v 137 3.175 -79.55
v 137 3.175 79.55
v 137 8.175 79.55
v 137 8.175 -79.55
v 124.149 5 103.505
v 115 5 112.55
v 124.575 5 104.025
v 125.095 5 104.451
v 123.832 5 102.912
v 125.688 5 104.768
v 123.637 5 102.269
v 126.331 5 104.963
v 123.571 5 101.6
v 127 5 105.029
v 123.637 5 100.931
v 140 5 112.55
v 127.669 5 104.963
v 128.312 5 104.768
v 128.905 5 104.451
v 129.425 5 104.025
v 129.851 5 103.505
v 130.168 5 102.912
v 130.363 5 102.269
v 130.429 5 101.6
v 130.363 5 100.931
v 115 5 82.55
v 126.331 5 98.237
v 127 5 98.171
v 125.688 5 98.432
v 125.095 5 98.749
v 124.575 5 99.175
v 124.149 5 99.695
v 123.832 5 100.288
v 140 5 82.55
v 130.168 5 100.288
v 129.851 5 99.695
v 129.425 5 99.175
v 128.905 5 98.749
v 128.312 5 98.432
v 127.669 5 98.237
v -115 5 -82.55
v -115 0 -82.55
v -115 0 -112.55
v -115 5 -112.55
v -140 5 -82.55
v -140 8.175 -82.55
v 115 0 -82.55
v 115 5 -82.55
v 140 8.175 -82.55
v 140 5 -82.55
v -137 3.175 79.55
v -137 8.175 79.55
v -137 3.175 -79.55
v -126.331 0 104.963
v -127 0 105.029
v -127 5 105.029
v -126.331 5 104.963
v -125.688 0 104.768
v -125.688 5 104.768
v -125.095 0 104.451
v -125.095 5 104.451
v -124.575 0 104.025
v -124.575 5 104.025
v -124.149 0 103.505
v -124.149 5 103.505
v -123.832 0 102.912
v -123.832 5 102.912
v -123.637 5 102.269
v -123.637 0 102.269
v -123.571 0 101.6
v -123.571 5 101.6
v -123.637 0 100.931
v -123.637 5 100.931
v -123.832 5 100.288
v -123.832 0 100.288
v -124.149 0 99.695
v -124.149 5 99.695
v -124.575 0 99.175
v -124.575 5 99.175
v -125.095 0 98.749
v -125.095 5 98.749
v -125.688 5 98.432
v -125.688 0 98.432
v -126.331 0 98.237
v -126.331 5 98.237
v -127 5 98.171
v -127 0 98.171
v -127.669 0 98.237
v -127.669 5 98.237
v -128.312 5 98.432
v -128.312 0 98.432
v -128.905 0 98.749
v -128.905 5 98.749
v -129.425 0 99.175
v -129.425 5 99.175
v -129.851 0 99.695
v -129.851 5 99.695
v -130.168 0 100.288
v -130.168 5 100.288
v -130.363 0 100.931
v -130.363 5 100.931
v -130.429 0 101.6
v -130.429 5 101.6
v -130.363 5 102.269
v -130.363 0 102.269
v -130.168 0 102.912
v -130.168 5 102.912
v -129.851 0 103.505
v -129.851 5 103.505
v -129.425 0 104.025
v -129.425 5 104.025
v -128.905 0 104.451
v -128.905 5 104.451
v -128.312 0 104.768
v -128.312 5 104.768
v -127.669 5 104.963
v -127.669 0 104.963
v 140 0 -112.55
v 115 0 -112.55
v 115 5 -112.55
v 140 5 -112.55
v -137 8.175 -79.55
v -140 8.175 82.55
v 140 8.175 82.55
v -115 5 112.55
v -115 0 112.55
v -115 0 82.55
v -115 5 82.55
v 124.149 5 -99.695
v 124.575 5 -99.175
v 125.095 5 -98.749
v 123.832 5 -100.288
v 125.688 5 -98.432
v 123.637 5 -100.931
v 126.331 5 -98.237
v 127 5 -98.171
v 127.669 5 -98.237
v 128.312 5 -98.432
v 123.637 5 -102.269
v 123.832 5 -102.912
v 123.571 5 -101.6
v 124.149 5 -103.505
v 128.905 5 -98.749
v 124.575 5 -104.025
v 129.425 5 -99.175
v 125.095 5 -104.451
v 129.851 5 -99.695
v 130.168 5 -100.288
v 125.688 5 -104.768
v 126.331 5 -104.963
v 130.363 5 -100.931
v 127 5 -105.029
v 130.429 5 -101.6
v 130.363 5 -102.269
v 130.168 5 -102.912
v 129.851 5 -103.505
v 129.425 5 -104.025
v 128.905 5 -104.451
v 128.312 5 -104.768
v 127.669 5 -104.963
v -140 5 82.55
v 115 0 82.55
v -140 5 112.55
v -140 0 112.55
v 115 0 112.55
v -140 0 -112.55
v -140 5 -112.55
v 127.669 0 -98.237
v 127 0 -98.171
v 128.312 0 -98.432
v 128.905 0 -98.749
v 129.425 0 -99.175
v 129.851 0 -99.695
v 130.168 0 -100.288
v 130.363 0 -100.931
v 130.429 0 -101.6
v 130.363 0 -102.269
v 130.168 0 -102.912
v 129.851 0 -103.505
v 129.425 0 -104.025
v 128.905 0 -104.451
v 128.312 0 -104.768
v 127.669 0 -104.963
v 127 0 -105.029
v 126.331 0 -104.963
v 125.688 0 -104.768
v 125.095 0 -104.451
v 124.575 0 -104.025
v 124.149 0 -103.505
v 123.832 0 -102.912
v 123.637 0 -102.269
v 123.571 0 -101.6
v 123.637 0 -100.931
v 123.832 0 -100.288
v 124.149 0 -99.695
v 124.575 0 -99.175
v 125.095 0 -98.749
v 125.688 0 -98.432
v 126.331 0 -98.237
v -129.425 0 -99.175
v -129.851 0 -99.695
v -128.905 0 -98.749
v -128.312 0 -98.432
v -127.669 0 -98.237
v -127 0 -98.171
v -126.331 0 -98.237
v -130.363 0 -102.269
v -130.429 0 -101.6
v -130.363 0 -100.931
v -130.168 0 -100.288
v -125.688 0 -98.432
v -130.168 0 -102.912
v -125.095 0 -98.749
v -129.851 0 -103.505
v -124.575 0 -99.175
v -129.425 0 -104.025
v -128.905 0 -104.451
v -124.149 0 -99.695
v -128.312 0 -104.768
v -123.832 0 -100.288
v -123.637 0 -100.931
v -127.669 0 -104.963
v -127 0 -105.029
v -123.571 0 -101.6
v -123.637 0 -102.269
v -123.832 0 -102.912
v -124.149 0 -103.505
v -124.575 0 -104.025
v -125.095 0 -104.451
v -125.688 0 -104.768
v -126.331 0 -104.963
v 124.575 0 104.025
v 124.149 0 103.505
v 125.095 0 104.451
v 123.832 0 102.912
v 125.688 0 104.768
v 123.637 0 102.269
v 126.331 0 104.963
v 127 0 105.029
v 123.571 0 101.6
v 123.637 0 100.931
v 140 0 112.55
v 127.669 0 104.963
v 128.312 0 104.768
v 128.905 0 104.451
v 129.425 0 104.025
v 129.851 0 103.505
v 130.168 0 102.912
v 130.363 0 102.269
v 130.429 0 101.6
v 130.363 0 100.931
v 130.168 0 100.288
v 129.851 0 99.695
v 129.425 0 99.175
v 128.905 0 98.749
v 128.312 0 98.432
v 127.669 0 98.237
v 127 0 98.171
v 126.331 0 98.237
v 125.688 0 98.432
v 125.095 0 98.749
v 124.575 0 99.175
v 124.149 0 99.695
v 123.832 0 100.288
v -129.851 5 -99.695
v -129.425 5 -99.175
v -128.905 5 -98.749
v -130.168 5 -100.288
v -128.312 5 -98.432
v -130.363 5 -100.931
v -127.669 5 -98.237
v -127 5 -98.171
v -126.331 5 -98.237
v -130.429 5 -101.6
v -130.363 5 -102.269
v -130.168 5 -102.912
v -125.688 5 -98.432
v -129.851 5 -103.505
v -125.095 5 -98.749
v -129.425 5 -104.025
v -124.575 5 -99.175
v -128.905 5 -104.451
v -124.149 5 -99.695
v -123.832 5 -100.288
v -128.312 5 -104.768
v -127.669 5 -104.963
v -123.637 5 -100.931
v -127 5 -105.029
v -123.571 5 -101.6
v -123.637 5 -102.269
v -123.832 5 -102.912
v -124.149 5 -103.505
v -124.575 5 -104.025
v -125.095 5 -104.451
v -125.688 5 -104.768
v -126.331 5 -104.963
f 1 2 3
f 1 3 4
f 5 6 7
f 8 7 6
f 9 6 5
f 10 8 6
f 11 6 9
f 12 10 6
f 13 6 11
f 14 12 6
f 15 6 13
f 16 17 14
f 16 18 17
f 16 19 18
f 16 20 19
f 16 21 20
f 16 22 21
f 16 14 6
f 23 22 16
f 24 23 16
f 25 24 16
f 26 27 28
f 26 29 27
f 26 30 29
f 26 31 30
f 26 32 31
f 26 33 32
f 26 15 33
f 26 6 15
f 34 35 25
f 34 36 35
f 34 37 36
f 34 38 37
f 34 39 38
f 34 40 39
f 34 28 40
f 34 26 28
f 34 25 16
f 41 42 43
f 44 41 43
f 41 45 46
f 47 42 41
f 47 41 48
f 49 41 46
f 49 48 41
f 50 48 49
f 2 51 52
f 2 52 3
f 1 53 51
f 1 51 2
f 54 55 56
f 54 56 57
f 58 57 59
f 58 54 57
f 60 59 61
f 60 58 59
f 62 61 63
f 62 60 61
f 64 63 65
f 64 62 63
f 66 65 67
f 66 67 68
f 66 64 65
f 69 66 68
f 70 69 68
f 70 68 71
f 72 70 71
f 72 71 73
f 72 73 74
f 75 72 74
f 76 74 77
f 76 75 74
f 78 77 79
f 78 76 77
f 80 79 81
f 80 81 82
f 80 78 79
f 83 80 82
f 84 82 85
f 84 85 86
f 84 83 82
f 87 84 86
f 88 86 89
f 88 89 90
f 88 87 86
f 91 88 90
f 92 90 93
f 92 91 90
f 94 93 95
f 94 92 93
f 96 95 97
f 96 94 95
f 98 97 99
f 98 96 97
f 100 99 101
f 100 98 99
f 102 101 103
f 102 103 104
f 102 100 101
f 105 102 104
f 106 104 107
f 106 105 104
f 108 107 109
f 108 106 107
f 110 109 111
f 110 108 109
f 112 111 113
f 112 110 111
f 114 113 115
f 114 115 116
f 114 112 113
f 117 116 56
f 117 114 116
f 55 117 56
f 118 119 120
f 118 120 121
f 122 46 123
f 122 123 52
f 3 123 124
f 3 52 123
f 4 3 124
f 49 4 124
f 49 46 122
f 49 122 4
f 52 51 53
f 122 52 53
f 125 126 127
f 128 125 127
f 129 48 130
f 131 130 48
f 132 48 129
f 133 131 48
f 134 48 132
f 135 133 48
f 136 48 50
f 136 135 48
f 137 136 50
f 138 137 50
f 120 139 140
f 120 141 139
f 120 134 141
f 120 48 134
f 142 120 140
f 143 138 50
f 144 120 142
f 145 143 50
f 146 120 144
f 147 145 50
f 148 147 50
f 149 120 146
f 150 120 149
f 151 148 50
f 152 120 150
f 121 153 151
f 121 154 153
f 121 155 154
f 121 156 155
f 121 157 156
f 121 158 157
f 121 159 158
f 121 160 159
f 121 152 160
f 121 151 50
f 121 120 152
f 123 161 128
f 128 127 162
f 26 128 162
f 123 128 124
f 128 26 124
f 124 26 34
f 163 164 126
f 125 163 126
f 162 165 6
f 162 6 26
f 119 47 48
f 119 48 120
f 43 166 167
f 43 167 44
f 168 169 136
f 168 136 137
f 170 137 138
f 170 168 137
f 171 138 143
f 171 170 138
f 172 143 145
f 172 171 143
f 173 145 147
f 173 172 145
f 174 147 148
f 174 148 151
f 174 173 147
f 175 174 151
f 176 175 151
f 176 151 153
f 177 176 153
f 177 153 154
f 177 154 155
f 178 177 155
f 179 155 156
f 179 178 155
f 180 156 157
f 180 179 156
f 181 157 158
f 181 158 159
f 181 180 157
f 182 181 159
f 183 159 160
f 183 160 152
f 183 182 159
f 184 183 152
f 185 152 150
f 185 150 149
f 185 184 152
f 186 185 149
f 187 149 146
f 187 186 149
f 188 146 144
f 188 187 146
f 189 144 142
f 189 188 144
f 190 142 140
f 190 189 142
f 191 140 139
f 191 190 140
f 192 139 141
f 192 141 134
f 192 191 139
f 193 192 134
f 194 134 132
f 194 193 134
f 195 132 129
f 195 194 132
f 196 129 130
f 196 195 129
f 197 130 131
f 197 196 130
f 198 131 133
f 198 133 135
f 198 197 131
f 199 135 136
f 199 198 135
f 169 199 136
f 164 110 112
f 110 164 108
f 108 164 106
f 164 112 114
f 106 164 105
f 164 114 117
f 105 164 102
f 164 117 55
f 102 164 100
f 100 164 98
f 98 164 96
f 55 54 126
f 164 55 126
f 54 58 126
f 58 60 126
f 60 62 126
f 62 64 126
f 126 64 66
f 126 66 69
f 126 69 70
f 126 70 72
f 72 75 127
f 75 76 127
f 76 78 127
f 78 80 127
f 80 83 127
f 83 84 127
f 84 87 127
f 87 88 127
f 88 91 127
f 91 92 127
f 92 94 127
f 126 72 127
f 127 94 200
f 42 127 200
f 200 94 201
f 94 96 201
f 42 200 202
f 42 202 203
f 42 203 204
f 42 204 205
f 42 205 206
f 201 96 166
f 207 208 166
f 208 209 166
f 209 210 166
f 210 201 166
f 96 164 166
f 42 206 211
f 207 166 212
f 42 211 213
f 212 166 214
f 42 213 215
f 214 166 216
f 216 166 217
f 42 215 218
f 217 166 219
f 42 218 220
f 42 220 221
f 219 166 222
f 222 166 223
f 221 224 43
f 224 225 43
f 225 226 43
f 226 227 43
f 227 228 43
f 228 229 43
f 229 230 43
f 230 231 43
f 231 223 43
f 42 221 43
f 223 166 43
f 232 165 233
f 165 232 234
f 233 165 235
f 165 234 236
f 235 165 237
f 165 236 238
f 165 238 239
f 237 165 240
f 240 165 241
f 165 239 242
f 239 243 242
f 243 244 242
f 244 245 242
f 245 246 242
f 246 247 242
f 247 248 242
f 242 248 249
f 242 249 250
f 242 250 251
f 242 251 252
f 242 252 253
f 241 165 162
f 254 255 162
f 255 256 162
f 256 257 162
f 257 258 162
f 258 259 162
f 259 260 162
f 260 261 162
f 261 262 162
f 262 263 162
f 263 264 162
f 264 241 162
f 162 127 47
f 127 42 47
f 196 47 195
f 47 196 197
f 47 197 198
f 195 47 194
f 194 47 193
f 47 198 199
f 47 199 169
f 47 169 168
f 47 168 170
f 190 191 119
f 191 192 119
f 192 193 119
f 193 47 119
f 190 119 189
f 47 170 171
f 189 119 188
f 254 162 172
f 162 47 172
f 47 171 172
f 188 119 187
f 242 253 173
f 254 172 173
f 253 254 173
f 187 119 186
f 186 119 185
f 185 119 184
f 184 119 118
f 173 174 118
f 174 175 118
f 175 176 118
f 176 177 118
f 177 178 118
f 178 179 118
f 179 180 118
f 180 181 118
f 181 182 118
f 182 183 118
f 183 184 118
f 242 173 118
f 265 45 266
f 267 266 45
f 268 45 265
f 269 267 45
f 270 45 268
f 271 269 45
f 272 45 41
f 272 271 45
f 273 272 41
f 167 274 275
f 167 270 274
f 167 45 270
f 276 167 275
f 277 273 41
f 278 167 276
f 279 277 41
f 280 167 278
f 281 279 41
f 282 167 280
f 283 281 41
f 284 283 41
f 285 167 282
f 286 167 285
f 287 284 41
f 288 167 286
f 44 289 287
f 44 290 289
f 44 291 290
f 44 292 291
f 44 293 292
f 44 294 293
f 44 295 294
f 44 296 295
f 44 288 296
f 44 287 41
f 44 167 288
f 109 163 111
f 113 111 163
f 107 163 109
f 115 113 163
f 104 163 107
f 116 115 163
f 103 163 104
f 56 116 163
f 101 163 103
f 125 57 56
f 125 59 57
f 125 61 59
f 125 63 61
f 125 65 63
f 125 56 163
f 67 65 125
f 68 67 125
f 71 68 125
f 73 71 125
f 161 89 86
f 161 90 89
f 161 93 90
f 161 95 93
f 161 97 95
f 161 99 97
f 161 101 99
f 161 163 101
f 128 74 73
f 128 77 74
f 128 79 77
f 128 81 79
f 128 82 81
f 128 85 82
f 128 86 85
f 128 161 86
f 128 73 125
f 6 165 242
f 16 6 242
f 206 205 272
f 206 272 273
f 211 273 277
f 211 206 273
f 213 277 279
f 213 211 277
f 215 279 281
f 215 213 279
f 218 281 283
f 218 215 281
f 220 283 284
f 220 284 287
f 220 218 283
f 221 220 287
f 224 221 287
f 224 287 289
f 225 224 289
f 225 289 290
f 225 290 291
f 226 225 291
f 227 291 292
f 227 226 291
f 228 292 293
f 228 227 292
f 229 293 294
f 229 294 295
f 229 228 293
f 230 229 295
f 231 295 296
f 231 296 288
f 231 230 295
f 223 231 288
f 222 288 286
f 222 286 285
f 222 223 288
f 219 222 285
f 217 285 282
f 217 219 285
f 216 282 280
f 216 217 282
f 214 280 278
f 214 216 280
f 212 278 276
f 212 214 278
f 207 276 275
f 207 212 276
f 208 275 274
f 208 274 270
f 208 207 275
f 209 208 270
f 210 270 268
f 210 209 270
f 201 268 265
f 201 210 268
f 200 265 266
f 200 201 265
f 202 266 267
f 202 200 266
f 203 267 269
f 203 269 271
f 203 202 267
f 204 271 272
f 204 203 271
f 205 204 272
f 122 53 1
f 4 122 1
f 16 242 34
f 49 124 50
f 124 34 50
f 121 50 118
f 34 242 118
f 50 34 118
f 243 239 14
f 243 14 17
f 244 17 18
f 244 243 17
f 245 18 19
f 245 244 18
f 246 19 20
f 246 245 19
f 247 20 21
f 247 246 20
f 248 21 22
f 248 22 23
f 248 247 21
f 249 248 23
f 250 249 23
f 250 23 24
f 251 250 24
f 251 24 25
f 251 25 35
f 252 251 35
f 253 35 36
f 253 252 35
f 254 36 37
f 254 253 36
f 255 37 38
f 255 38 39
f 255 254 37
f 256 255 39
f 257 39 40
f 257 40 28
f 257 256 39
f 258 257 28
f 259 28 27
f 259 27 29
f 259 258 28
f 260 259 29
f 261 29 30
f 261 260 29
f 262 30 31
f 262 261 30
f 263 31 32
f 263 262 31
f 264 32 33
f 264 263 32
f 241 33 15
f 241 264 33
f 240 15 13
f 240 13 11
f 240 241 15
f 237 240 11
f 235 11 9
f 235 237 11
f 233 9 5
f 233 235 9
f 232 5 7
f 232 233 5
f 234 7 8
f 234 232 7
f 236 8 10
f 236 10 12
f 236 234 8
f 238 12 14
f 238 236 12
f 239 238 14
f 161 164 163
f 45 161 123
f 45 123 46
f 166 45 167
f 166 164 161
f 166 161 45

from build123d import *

# Parameters (mm, degrees)
SKETCH1_W           = 280
SKETCH1_H           = 165.1
BOSS_EXTRUDE1_DEPTH = 3.175
SKETCH2_W           = 280
SKETCH2_H           = 165.1
SKETCH2_W_2         = 274
SKETCH2_H_2         = 159.1
BOSS_EXTRUDE2_DEPTH = 5
SKETCH3_W           = 25
SKETCH3_H           = 30
SKETCH3_R           = 3.429
BOSS_EXTRUDE3_DEPTH = 5


with BuildPart() as part:
    # Sketch1 → Boss-Extrude1 (new body)
    with BuildSketch(Plane(origin=(0, 0, 0), x_dir=(1, 0, 0), z_dir=(0, 1, 0))):
        Rectangle(SKETCH1_W, SKETCH1_H)
    extrude(amount=BOSS_EXTRUDE1_DEPTH)

    # Sketch2 → Boss-Extrude2 (add)
    with BuildSketch(Plane(origin=(0, 3.175, 0), x_dir=(1, 0, 0), z_dir=(0, 1, 0))):
        Rectangle(SKETCH2_W, SKETCH2_H)
        Rectangle(SKETCH2_W_2, SKETCH2_H_2, mode=Mode.SUBTRACT)
    extrude(amount=BOSS_EXTRUDE2_DEPTH)

    # Sketch3 → Boss-Extrude3 (add)
    # profile 1 of 4: a face of its own
    with BuildSketch(Plane(origin=(0, 0, 0), x_dir=(1, 0, 0), z_dir=(0, 1, 0))):
        with Locations((-127.5, 97.55)):
            Rectangle(SKETCH3_W, SKETCH3_H)
        with Locations(Location((-127, 101.6, 0), (0, 0, 270))):
            Circle(SKETCH3_R, mode=Mode.SUBTRACT)
    # profile 2 of 4: a face of its own
    with BuildSketch(Plane(origin=(0, 0, 0), x_dir=(1, 0, 0), z_dir=(0, 1, 0))):
        with Locations((127.5, 97.55)):
            Rectangle(SKETCH3_W, SKETCH3_H)
        with Locations(Location((127, 101.6, 0), (0, 0, 270))):
            Circle(SKETCH3_R, mode=Mode.SUBTRACT)
    # profile 3 of 4: a face of its own
    with BuildSketch(Plane(origin=(0, 0, 0), x_dir=(1, 0, 0), z_dir=(0, 1, 0))):
        with Locations((-127.5, -97.55)):
            Rectangle(SKETCH3_W, SKETCH3_H)
        with Locations(Location((-127, -101.6, 0), (0, 0, 270))):
            Circle(SKETCH3_R, mode=Mode.SUBTRACT)
    # profile 4 of 4: a face of its own
    with BuildSketch(Plane(origin=(0, 0, 0), x_dir=(1, 0, 0), z_dir=(0, 1, 0))):
        with Locations((127.5, -97.55)):
            Rectangle(SKETCH3_W, SKETCH3_H)
        with Locations(Location((127, -101.6, 0), (0, 0, 270))):
            Circle(SKETCH3_R, mode=Mode.SUBTRACT)
    extrude(amount=BOSS_EXTRUDE3_DEPTH)


solid = part.part
